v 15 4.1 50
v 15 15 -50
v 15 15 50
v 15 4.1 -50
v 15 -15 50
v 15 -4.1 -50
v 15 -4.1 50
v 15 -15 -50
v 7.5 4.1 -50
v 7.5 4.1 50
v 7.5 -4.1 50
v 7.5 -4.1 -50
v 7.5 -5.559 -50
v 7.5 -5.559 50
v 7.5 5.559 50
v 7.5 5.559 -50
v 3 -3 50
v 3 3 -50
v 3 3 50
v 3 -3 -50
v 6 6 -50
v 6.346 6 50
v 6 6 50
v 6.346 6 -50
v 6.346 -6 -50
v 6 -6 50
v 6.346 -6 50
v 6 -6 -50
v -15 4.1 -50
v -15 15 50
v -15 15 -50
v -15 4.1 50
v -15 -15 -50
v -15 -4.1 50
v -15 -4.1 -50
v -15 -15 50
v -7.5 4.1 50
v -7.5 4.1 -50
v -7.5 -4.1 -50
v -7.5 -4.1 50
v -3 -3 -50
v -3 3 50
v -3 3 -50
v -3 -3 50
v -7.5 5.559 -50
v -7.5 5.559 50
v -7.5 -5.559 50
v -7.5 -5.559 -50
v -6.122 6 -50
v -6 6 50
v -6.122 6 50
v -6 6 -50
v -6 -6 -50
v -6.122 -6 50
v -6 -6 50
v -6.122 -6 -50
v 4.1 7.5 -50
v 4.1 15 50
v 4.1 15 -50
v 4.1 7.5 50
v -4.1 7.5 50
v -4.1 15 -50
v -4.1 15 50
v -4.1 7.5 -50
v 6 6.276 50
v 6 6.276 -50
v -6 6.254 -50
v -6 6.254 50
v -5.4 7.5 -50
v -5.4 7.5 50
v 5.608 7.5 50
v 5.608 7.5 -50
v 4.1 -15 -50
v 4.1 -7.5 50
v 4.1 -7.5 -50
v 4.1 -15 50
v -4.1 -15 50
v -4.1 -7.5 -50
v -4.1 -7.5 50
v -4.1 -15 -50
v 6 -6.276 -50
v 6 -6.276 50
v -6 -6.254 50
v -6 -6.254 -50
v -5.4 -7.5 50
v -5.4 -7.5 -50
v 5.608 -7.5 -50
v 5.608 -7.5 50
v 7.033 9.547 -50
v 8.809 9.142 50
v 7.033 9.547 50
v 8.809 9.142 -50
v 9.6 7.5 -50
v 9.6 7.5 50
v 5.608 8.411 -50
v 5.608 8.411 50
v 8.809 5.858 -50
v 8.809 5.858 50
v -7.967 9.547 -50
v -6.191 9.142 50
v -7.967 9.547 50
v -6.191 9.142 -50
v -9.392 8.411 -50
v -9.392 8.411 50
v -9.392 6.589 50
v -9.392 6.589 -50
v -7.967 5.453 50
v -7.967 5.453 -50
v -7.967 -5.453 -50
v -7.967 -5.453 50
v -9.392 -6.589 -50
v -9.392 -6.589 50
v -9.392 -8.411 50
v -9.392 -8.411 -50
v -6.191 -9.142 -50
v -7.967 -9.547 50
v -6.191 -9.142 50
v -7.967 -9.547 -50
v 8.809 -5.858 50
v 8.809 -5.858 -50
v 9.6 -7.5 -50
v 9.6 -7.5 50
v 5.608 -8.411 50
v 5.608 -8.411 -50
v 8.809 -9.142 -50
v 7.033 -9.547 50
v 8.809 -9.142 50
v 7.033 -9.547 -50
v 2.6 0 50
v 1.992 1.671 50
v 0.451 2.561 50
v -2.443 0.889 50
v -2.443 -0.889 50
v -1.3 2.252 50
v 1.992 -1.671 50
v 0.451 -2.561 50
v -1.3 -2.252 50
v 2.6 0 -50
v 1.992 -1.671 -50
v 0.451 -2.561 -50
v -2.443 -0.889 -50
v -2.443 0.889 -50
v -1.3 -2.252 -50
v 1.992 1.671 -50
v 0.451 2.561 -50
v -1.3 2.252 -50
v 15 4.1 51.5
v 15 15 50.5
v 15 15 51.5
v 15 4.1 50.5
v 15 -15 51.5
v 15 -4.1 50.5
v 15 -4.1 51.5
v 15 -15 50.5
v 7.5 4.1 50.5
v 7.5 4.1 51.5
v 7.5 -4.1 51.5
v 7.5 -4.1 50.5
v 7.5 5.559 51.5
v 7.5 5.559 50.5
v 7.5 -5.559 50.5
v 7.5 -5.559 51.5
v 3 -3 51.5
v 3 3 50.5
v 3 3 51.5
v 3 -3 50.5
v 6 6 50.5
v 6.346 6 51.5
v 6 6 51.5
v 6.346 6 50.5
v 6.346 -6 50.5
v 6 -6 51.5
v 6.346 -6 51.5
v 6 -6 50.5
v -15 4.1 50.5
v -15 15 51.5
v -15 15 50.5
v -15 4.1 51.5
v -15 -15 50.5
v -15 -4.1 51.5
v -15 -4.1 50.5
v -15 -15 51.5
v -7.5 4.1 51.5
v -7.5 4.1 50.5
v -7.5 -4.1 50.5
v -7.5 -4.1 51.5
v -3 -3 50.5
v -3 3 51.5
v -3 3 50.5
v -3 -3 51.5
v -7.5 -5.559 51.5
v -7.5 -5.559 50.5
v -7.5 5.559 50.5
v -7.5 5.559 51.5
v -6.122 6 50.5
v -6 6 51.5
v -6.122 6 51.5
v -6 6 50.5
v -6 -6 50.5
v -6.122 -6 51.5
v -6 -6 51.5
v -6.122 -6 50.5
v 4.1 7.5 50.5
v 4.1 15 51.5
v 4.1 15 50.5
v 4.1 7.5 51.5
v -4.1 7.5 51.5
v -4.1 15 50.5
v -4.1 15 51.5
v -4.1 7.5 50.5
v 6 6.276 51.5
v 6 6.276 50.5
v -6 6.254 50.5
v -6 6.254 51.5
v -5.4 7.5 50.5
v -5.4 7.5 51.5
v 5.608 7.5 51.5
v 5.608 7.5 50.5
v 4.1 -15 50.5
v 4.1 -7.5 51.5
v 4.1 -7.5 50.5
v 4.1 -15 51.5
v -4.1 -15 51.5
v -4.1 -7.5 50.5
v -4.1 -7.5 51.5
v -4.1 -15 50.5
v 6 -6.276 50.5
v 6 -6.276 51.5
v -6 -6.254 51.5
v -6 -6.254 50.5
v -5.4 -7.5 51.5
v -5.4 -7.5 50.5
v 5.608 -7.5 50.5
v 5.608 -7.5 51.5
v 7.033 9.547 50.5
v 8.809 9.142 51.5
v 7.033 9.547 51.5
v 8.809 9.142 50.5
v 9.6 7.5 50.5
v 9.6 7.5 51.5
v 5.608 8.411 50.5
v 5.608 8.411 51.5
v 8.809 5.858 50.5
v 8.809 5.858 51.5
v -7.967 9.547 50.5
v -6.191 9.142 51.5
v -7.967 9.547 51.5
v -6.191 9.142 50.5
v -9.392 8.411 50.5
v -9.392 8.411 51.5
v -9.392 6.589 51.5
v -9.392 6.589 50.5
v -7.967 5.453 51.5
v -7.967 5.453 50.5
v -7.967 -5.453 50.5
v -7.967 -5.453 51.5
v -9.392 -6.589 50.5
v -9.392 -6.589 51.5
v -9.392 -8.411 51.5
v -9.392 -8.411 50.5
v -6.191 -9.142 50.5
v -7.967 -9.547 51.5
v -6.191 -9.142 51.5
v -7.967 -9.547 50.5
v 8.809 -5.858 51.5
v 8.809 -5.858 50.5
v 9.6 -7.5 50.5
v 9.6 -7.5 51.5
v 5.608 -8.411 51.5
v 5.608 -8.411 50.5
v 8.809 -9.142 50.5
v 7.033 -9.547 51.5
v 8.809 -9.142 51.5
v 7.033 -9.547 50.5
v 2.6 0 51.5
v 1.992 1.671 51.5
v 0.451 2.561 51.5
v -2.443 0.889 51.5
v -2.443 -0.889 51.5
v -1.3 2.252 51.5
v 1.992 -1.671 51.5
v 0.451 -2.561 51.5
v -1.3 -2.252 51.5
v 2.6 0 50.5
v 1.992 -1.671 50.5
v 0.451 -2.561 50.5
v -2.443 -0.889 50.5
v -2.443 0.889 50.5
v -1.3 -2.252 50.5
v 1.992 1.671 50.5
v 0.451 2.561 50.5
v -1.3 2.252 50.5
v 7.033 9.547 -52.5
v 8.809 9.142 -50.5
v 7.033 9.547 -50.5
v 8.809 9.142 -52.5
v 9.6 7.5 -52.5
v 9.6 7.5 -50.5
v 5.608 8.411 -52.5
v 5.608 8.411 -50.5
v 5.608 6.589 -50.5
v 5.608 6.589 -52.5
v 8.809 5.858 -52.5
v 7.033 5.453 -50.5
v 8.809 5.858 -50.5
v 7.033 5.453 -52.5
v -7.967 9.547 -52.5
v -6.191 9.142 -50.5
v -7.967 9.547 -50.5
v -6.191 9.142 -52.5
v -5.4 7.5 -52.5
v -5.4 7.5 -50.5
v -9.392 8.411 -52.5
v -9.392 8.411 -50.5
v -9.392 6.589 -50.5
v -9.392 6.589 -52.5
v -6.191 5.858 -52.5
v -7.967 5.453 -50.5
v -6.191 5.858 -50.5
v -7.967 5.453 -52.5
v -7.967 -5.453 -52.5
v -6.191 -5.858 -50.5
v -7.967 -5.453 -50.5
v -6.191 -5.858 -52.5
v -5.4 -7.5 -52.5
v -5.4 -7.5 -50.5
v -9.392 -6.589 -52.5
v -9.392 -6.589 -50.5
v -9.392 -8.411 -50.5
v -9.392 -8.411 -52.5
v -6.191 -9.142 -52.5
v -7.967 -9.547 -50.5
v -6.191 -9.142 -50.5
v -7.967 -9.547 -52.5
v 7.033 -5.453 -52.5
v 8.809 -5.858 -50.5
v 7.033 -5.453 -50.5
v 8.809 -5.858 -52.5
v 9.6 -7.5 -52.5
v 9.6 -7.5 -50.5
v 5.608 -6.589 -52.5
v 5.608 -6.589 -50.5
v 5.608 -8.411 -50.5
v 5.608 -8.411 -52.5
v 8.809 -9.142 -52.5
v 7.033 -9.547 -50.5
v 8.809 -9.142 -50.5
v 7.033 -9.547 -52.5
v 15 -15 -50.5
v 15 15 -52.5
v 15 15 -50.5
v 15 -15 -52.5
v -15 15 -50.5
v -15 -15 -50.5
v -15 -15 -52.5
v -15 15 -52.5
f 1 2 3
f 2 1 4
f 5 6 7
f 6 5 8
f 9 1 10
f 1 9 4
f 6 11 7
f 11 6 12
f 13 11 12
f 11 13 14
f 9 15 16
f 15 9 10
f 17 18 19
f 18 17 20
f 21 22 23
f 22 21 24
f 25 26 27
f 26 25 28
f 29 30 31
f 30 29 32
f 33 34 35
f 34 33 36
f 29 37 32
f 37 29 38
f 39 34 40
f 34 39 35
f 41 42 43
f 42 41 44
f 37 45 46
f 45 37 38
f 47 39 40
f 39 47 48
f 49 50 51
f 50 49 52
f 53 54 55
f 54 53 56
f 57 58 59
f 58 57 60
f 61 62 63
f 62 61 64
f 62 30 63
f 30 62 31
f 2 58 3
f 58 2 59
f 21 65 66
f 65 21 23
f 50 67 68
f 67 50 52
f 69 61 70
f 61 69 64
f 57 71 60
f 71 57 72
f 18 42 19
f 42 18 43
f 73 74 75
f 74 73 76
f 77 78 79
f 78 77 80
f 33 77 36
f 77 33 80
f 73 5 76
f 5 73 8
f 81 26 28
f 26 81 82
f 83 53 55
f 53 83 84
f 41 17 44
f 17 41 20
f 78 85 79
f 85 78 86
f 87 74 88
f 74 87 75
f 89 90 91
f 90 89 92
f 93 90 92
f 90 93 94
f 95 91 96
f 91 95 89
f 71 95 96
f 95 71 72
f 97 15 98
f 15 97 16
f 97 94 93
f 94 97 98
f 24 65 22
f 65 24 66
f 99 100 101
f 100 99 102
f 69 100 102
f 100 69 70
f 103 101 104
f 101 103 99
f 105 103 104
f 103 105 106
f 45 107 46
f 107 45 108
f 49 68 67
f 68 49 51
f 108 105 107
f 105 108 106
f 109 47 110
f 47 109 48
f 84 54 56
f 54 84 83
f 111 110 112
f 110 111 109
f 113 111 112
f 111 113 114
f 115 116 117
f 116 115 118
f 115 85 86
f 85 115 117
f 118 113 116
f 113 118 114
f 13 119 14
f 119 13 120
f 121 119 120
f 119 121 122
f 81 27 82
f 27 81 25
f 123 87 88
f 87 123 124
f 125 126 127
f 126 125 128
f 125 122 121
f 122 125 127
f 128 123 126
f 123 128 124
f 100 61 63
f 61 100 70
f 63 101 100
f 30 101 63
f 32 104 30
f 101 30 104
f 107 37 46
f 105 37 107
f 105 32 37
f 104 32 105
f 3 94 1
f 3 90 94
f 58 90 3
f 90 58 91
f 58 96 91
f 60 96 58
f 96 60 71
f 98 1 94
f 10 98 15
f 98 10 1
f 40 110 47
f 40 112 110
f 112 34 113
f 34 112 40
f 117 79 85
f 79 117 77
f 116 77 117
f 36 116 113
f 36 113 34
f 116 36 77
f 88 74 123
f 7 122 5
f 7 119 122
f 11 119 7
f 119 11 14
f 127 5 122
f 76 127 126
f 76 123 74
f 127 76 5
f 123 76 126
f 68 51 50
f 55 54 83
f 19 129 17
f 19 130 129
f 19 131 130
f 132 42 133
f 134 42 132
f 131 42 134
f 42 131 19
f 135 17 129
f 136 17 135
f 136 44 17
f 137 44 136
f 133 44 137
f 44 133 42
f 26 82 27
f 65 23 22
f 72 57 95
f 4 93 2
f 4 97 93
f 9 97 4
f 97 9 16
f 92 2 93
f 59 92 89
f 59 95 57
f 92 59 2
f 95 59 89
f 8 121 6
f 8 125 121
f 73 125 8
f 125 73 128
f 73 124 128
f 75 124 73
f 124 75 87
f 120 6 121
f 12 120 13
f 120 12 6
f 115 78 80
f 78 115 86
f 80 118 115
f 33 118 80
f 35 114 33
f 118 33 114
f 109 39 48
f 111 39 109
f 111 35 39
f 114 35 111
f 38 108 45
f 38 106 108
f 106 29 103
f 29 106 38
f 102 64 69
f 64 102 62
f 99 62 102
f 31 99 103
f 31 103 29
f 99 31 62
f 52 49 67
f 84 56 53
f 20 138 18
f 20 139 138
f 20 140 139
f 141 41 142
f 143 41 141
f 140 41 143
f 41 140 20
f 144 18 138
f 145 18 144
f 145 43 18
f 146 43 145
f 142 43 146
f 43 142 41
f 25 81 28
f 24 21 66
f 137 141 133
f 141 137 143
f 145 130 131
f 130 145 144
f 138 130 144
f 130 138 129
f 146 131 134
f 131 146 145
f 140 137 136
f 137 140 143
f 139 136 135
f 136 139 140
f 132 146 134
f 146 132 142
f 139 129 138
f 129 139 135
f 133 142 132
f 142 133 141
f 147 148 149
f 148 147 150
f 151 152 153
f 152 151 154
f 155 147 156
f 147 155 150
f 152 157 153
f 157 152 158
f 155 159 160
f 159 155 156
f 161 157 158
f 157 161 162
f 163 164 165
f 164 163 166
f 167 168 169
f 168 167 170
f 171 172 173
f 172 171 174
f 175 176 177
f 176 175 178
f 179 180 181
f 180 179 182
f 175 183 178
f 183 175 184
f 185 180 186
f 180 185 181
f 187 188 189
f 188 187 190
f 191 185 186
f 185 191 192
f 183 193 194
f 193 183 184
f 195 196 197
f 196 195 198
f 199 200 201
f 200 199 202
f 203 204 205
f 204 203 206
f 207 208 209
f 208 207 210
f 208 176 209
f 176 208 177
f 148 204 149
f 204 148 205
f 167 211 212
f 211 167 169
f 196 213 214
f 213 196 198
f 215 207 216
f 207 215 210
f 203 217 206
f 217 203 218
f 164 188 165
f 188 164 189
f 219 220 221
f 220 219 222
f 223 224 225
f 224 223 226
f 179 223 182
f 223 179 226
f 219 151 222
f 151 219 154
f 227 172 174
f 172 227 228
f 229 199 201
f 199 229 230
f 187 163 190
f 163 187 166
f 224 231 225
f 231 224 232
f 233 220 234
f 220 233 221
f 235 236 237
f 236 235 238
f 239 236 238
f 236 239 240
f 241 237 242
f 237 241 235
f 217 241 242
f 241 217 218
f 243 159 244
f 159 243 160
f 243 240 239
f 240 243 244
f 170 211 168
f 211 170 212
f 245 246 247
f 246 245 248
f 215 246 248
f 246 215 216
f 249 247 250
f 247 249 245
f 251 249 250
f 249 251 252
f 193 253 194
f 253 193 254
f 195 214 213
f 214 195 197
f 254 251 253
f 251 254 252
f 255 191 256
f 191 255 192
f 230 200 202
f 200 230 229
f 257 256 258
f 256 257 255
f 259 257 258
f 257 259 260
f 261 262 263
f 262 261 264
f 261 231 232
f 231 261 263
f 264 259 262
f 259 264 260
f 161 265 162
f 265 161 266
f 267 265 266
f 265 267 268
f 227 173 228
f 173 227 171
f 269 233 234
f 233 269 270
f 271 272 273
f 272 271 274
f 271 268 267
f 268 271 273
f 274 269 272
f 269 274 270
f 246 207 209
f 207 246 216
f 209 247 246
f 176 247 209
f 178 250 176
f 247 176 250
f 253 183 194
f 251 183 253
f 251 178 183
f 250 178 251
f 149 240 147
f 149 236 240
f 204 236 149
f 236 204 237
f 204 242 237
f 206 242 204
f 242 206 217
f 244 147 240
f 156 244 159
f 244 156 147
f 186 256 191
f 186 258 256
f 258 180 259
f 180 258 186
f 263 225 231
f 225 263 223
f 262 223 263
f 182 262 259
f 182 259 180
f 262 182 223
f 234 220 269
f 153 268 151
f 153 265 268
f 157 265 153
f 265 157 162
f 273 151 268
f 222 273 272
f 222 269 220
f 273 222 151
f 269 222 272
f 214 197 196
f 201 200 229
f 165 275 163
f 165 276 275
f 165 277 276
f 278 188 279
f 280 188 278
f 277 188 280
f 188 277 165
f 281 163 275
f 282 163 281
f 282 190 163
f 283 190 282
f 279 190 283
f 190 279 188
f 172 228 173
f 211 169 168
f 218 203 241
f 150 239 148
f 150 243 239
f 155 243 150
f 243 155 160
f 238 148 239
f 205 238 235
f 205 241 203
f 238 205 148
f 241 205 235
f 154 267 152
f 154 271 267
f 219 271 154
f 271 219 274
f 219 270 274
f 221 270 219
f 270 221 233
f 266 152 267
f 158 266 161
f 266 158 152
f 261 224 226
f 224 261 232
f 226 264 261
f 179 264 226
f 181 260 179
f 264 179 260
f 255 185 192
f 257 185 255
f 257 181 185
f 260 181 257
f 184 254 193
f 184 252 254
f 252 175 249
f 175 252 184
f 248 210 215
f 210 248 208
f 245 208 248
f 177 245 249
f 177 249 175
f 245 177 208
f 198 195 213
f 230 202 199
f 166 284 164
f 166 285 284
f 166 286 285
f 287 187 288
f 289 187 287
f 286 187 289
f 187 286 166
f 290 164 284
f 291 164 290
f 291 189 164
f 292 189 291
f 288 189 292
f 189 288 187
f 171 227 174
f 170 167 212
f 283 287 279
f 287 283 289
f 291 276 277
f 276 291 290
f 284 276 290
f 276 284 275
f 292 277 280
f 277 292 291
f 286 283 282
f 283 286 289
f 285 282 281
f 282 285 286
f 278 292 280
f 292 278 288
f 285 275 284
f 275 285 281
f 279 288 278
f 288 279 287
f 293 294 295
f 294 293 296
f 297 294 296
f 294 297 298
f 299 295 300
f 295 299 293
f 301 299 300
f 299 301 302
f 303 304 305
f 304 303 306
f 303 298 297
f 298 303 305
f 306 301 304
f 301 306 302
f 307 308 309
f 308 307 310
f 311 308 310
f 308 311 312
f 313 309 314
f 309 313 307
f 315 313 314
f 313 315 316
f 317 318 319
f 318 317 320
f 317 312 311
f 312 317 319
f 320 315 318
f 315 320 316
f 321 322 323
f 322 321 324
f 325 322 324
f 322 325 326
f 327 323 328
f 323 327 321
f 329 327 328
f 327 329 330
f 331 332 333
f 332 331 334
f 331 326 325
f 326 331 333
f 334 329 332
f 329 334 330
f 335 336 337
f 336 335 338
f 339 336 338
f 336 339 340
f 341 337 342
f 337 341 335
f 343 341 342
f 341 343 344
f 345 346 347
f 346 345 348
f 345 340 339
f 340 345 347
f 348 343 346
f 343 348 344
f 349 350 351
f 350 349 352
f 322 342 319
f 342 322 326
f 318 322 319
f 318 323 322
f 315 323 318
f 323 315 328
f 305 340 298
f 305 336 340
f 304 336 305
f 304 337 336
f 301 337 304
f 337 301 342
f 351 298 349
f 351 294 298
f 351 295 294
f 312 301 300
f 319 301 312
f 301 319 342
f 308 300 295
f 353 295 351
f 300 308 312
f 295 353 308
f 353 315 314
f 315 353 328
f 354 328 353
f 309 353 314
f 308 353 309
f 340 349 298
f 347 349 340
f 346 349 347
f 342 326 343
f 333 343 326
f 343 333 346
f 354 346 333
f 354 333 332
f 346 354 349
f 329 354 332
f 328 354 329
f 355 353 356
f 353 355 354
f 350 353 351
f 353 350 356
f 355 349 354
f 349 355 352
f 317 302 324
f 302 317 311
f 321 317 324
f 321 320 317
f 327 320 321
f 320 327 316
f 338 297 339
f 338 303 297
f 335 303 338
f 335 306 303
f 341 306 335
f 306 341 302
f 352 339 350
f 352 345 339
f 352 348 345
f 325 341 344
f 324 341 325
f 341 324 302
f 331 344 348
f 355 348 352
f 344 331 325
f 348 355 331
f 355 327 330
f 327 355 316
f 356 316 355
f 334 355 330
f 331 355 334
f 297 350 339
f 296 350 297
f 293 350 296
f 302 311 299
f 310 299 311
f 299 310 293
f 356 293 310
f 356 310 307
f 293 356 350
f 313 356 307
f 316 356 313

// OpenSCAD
// Parameters
cross_section_width_mm = 30; //[15:60:0.5]
cross_section_height_mm = 30; //[15:60:0.5]
length_mm = 100; //[50:200:1]
t_slot_opening_mm = 8.2; //[6:12:0.1]
t_slot_depth_mm = 7.5; //[4:12:0.1]
t_slot_inner_width_mm = 12; //[8:18:0.1]
t_slot_inner_depth_mm = 3.5; //[2:8:0.1]
center_bore_diameter_mm = 5.2; //[3:10:0.1]
corner_hole_diameter_mm = 4.2; //[2.5:8:0.1]
corner_hole_inset_mm = 7.5; //[5:12:0.1]
cut_overlap_mm = 1; //[0.5:2:0.1]

// Extrusion - complete detailed geometry
module extrusion() {
  color("Silver") {
    difference() {
      // Main body
      cube([cross_section_width_mm, cross_section_height_mm, length_mm], center=true);
      
      // Center bore
      translate([0, 0, 0])
        cylinder(r=center_bore_diameter_mm/2, h=length_mm + 2*cut_overlap_mm, center=true);
      
      // T-slot channels
      union() {
        // X-axis slots
        translate([cross_section_width_mm/2 - (t_slot_depth_mm + cut_overlap_mm)/2, 0, 0])
          cube([t_slot_depth_mm + cut_overlap_mm, t_slot_opening_mm, length_mm + 2*cut_overlap_mm], center=true);
        translate([cross_section_width_mm/2 - t_slot_depth_mm - (t_slot_inner_depth_mm + cut_overlap_mm)/2, 0, 0])
          cube([t_slot_inner_depth_mm + cut_overlap_mm, t_slot_inner_width_mm, length_mm + 2*cut_overlap_mm], center=true);
        translate([-cross_section_width_mm/2 + (t_slot_depth_mm + cut_overlap_mm)/2, 0, 0])
          cube([t_slot_depth_mm + cut_overlap_mm, t_slot_opening_mm, length_mm + 2*cut_overlap_mm], center=true);
        translate([-cross_section_width_mm/2 + t_slot_depth_mm + (t_slot_inner_depth_mm + cut_overlap_mm)/2, 0, 0])
          cube([t_slot_inner_depth_mm + cut_overlap_mm, t_slot_inner_width_mm, length_mm + 2*cut_overlap_mm], center=true);
        
        // Y-axis slots
        translate([0, cross_section_height_mm/2 - (t_slot_depth_mm + cut_overlap_mm)/2, 0])
          cube([t_slot_opening_mm, t_slot_depth_mm + cut_overlap_mm, length_mm + 2*cut_overlap_mm], center=true);
        translate([0, cross_section_height_mm/2 - t_slot_depth_mm - (t_slot_inner_depth_mm + cut_overlap_mm)/2, 0])
          cube([t_slot_inner_width_mm, t_slot_inner_depth_mm + cut_overlap_mm, length_mm + 2*cut_overlap_mm], center=true);
        translate([0, -cross_section_height_mm/2 + (t_slot_depth_mm + cut_overlap_mm)/2, 0])
          cube([t_slot_opening_mm, t_slot_depth_mm + cut_overlap_mm, length_mm + 2*cut_overlap_mm], center=true);
        translate([0, -cross_section_height_mm/2 + t_slot_depth_mm + (t_slot_inner_depth_mm + cut_overlap_mm)/2, 0])
          cube([t_slot_inner_width_mm, t_slot_inner_depth_mm + cut_overlap_mm, length_mm + 2*cut_overlap_mm], center=true);
      }
      
      // Corner holes
      union() {
        translate([cross_section_width_mm/2 - corner_hole_inset_mm, cross_section_height_mm/2 - corner_hole_inset_mm, 0])
          cylinder(r=corner_hole_diameter_mm/2, h=length_mm + 2*cut_overlap_mm, center=true);
        translate([-cross_section_width_mm/2 + corner_hole_inset_mm, cross_section_height_mm/2 - corner_hole_inset_mm, 0])
          cylinder(r=corner_hole_diameter_mm/2, h=length_mm + 2*cut_overlap_mm, center=true);
        translate([-cross_section_width_mm/2 + corner_hole_inset_mm, -cross_section_height_mm/2 + corner_hole_inset_mm, 0])
          cylinder(r=corner_hole_diameter_mm/2, h=length_mm + 2*cut_overlap_mm, center=true);
        translate([cross_section_width_mm/2 - corner_hole_inset_mm, -cross_section_height_mm/2 + corner_hole_inset_mm, 0])
          cylinder(r=corner_hole_diameter_mm/2, h=length_mm + 2*cut_overlap_mm, center=true);
      }
    }
  }
}

// Extrusion Cross Section - detailed geometry
module extrusion_cross_section() {
  color("Silver") {
    difference() {
      // Main body
      cube([cross_section_width_mm, cross_section_height_mm, 1], center=true);
      
      // Center bore
      translate([0, 0, 0])
        cylinder(r=center_bore_diameter_mm/2, h=2, center=true);
      
      // T-slot channels
      union() {
        // X-axis slots
        translate([cross_section_width_mm/2 - (t_slot_depth_mm + cut_overlap_mm)/2, 0, 0])
          cube([t_slot_depth_mm + cut_overlap_mm, t_slot_opening_mm, 2], center=true);
        translate([cross_section_width_mm/2 - t_slot_depth_mm - (t_slot_inner_depth_mm + cut_overlap_mm)/2, 0, 0])
          cube([t_slot_inner_depth_mm + cut_overlap_mm, t_slot_inner_width_mm, 2], center=true);
        translate([-cross_section_width_mm/2 + (t_slot_depth_mm + cut_overlap_mm)/2, 0, 0])
          cube([t_slot_depth_mm + cut_overlap_mm, t_slot_opening_mm, 2], center=true);
        translate([-cross_section_width_mm/2 + t_slot_depth_mm + (t_slot_inner_depth_mm + cut_overlap_mm)/2, 0, 0])
          cube([t_slot_inner_depth_mm + cut_overlap_mm, t_slot_inner_width_mm, 2], center=true);
        
        // Y-axis slots
        translate([0, cross_section_height_mm/2 - (t_slot_depth_mm + cut_overlap_mm)/2, 0])
          cube([t_slot_opening_mm, t_slot_depth_mm + cut_overlap_mm, 2], center=true);
        translate([0, cross_section_height_mm/2 - t_slot_depth_mm - (t_slot_inner_depth_mm + cut_overlap_mm)/2, 0])
          cube([t_slot_inner_width_mm, t_slot_inner_depth_mm + cut_overlap_mm, 2], center=true);
        translate([0, -cross_section_height_mm/2 + (t_slot_depth_mm + cut_overlap_mm)/2, 0])
          cube([t_slot_opening_mm, t_slot_depth_mm + cut_overlap_mm, 2], center=true);
        translate([0, -cross_section_height_mm/2 + t_slot_depth_mm + (t_slot_inner_depth_mm + cut_overlap_mm)/2, 0])
          cube([t_slot_inner_width_mm, t_slot_inner_depth_mm + cut_overlap_mm, 2], center=true);
      }
      
      // Corner holes
      union() {
        translate([cross_section_width_mm/2 - corner_hole_inset_mm, cross_section_height_mm/2 - corner_hole_inset_mm, 0])
          cylinder(r=corner_hole_diameter_mm/2, h=2, center=true);
        translate([-cross_section_width_mm/2 + corner_hole_inset_mm, cross_section_height_mm/2 - corner_hole_inset_mm, 0])
          cylinder(r=corner_hole_diameter_mm/2, h=2, center=true);
        translate([-cross_section_width_mm/2 + corner_hole_inset_mm, -cross_section_height_mm/2 + corner_hole_inset_mm, 0])
          cylinder(r=corner_hole_diameter_mm/2, h=2, center=true);
        translate([cross_section_width_mm/2 - corner_hole_inset_mm, -cross_section_height_mm/2 + corner_hole_inset_mm, 0])
          cylinder(r=corner_hole_diameter_mm/2, h=2, center=true);
      }
    }
  }
}

// Box Corner Profile Section - detailed geometry
module box_corner_profile_section() {
  color("Silver") {
    difference() {
      // Main body
      cube([cross_section_width_mm, cross_section_height_mm, 1], center=true);
      
      // Corner holes
      union() {
        translate([cross_section_width_mm/2 - corner_hole_inset_mm, cross_section_height_mm/2 - corner_hole_inset_mm, 0])
          cylinder(r=corner_hole_diameter_mm/2, h=2, center=true);
        translate([-cross_section_width_mm/2 + corner_hole_inset_mm, cross_section_height_mm/2 - corner_hole_inset_mm, 0])
          cylinder(r=corner_hole_diameter_mm/2, h=2, center=true);
        translate([-cross_section_width_mm/2 + corner_hole_inset_mm, -cross_section_height_mm/2 + corner_hole_inset_mm, 0])
          cylinder(r=corner_hole_diameter_mm/2, h=2, center=true);
        translate([cross_section_width_mm/2 - corner_hole_inset_mm, -cross_section_height_mm/2 + corner_hole_inset_mm, 0])
          cylinder(r=corner_hole_diameter_mm/2, h=2, center=true);
      }
    }
  }
}

// Box Corner Profile Sections - detailed geometry
module box_corner_profile_sections() {
  color("Silver") {
    difference() {
      // Main body
      cube([cross_section_width_mm, cross_section_height_mm, 1], center=true);
      
      // Corner holes
      union() {
        translate([cross_section_width_mm/2 - corner_hole_inset_mm, cross_section_height_mm/2 - corner_hole_inset_mm, 0])
          cylinder(r=corner_hole_diameter_mm/2, h=2, center=true);
        translate([-cross_section_width_mm/2 + corner_hole_inset_mm, cross_section_height_mm/2 - corner_hole_inset_mm, 0])
          cylinder(r=corner_hole_diameter_mm/2, h=2, center=true);
        translate([-cross_section_width_mm/2 + corner_hole_inset_mm, -cross_section_height_mm/2 + corner_hole_inset_mm, 0])
          cylinder(r=corner_hole_diameter_mm/2, h=2, center=true);
        translate([cross_section_width_mm/2 - corner_hole_inset_mm, -cross_section_height_mm/2 + corner_hole_inset_mm, 0])
          cylinder(r=corner_hole_diameter_mm/2, h=2, center=true);
      }
    }
  }
}

// Assembly
module assembly() {
  extrusion();
  translate([0, 0, length_mm/2 + 1]) extrusion_cross_section();
  translate([0, 0, -length_mm/2 - 1]) box_corner_profile_section();
  translate([0, 0, -length_mm/2 - 2]) box_corner_profile_sections();
}

assembly();
